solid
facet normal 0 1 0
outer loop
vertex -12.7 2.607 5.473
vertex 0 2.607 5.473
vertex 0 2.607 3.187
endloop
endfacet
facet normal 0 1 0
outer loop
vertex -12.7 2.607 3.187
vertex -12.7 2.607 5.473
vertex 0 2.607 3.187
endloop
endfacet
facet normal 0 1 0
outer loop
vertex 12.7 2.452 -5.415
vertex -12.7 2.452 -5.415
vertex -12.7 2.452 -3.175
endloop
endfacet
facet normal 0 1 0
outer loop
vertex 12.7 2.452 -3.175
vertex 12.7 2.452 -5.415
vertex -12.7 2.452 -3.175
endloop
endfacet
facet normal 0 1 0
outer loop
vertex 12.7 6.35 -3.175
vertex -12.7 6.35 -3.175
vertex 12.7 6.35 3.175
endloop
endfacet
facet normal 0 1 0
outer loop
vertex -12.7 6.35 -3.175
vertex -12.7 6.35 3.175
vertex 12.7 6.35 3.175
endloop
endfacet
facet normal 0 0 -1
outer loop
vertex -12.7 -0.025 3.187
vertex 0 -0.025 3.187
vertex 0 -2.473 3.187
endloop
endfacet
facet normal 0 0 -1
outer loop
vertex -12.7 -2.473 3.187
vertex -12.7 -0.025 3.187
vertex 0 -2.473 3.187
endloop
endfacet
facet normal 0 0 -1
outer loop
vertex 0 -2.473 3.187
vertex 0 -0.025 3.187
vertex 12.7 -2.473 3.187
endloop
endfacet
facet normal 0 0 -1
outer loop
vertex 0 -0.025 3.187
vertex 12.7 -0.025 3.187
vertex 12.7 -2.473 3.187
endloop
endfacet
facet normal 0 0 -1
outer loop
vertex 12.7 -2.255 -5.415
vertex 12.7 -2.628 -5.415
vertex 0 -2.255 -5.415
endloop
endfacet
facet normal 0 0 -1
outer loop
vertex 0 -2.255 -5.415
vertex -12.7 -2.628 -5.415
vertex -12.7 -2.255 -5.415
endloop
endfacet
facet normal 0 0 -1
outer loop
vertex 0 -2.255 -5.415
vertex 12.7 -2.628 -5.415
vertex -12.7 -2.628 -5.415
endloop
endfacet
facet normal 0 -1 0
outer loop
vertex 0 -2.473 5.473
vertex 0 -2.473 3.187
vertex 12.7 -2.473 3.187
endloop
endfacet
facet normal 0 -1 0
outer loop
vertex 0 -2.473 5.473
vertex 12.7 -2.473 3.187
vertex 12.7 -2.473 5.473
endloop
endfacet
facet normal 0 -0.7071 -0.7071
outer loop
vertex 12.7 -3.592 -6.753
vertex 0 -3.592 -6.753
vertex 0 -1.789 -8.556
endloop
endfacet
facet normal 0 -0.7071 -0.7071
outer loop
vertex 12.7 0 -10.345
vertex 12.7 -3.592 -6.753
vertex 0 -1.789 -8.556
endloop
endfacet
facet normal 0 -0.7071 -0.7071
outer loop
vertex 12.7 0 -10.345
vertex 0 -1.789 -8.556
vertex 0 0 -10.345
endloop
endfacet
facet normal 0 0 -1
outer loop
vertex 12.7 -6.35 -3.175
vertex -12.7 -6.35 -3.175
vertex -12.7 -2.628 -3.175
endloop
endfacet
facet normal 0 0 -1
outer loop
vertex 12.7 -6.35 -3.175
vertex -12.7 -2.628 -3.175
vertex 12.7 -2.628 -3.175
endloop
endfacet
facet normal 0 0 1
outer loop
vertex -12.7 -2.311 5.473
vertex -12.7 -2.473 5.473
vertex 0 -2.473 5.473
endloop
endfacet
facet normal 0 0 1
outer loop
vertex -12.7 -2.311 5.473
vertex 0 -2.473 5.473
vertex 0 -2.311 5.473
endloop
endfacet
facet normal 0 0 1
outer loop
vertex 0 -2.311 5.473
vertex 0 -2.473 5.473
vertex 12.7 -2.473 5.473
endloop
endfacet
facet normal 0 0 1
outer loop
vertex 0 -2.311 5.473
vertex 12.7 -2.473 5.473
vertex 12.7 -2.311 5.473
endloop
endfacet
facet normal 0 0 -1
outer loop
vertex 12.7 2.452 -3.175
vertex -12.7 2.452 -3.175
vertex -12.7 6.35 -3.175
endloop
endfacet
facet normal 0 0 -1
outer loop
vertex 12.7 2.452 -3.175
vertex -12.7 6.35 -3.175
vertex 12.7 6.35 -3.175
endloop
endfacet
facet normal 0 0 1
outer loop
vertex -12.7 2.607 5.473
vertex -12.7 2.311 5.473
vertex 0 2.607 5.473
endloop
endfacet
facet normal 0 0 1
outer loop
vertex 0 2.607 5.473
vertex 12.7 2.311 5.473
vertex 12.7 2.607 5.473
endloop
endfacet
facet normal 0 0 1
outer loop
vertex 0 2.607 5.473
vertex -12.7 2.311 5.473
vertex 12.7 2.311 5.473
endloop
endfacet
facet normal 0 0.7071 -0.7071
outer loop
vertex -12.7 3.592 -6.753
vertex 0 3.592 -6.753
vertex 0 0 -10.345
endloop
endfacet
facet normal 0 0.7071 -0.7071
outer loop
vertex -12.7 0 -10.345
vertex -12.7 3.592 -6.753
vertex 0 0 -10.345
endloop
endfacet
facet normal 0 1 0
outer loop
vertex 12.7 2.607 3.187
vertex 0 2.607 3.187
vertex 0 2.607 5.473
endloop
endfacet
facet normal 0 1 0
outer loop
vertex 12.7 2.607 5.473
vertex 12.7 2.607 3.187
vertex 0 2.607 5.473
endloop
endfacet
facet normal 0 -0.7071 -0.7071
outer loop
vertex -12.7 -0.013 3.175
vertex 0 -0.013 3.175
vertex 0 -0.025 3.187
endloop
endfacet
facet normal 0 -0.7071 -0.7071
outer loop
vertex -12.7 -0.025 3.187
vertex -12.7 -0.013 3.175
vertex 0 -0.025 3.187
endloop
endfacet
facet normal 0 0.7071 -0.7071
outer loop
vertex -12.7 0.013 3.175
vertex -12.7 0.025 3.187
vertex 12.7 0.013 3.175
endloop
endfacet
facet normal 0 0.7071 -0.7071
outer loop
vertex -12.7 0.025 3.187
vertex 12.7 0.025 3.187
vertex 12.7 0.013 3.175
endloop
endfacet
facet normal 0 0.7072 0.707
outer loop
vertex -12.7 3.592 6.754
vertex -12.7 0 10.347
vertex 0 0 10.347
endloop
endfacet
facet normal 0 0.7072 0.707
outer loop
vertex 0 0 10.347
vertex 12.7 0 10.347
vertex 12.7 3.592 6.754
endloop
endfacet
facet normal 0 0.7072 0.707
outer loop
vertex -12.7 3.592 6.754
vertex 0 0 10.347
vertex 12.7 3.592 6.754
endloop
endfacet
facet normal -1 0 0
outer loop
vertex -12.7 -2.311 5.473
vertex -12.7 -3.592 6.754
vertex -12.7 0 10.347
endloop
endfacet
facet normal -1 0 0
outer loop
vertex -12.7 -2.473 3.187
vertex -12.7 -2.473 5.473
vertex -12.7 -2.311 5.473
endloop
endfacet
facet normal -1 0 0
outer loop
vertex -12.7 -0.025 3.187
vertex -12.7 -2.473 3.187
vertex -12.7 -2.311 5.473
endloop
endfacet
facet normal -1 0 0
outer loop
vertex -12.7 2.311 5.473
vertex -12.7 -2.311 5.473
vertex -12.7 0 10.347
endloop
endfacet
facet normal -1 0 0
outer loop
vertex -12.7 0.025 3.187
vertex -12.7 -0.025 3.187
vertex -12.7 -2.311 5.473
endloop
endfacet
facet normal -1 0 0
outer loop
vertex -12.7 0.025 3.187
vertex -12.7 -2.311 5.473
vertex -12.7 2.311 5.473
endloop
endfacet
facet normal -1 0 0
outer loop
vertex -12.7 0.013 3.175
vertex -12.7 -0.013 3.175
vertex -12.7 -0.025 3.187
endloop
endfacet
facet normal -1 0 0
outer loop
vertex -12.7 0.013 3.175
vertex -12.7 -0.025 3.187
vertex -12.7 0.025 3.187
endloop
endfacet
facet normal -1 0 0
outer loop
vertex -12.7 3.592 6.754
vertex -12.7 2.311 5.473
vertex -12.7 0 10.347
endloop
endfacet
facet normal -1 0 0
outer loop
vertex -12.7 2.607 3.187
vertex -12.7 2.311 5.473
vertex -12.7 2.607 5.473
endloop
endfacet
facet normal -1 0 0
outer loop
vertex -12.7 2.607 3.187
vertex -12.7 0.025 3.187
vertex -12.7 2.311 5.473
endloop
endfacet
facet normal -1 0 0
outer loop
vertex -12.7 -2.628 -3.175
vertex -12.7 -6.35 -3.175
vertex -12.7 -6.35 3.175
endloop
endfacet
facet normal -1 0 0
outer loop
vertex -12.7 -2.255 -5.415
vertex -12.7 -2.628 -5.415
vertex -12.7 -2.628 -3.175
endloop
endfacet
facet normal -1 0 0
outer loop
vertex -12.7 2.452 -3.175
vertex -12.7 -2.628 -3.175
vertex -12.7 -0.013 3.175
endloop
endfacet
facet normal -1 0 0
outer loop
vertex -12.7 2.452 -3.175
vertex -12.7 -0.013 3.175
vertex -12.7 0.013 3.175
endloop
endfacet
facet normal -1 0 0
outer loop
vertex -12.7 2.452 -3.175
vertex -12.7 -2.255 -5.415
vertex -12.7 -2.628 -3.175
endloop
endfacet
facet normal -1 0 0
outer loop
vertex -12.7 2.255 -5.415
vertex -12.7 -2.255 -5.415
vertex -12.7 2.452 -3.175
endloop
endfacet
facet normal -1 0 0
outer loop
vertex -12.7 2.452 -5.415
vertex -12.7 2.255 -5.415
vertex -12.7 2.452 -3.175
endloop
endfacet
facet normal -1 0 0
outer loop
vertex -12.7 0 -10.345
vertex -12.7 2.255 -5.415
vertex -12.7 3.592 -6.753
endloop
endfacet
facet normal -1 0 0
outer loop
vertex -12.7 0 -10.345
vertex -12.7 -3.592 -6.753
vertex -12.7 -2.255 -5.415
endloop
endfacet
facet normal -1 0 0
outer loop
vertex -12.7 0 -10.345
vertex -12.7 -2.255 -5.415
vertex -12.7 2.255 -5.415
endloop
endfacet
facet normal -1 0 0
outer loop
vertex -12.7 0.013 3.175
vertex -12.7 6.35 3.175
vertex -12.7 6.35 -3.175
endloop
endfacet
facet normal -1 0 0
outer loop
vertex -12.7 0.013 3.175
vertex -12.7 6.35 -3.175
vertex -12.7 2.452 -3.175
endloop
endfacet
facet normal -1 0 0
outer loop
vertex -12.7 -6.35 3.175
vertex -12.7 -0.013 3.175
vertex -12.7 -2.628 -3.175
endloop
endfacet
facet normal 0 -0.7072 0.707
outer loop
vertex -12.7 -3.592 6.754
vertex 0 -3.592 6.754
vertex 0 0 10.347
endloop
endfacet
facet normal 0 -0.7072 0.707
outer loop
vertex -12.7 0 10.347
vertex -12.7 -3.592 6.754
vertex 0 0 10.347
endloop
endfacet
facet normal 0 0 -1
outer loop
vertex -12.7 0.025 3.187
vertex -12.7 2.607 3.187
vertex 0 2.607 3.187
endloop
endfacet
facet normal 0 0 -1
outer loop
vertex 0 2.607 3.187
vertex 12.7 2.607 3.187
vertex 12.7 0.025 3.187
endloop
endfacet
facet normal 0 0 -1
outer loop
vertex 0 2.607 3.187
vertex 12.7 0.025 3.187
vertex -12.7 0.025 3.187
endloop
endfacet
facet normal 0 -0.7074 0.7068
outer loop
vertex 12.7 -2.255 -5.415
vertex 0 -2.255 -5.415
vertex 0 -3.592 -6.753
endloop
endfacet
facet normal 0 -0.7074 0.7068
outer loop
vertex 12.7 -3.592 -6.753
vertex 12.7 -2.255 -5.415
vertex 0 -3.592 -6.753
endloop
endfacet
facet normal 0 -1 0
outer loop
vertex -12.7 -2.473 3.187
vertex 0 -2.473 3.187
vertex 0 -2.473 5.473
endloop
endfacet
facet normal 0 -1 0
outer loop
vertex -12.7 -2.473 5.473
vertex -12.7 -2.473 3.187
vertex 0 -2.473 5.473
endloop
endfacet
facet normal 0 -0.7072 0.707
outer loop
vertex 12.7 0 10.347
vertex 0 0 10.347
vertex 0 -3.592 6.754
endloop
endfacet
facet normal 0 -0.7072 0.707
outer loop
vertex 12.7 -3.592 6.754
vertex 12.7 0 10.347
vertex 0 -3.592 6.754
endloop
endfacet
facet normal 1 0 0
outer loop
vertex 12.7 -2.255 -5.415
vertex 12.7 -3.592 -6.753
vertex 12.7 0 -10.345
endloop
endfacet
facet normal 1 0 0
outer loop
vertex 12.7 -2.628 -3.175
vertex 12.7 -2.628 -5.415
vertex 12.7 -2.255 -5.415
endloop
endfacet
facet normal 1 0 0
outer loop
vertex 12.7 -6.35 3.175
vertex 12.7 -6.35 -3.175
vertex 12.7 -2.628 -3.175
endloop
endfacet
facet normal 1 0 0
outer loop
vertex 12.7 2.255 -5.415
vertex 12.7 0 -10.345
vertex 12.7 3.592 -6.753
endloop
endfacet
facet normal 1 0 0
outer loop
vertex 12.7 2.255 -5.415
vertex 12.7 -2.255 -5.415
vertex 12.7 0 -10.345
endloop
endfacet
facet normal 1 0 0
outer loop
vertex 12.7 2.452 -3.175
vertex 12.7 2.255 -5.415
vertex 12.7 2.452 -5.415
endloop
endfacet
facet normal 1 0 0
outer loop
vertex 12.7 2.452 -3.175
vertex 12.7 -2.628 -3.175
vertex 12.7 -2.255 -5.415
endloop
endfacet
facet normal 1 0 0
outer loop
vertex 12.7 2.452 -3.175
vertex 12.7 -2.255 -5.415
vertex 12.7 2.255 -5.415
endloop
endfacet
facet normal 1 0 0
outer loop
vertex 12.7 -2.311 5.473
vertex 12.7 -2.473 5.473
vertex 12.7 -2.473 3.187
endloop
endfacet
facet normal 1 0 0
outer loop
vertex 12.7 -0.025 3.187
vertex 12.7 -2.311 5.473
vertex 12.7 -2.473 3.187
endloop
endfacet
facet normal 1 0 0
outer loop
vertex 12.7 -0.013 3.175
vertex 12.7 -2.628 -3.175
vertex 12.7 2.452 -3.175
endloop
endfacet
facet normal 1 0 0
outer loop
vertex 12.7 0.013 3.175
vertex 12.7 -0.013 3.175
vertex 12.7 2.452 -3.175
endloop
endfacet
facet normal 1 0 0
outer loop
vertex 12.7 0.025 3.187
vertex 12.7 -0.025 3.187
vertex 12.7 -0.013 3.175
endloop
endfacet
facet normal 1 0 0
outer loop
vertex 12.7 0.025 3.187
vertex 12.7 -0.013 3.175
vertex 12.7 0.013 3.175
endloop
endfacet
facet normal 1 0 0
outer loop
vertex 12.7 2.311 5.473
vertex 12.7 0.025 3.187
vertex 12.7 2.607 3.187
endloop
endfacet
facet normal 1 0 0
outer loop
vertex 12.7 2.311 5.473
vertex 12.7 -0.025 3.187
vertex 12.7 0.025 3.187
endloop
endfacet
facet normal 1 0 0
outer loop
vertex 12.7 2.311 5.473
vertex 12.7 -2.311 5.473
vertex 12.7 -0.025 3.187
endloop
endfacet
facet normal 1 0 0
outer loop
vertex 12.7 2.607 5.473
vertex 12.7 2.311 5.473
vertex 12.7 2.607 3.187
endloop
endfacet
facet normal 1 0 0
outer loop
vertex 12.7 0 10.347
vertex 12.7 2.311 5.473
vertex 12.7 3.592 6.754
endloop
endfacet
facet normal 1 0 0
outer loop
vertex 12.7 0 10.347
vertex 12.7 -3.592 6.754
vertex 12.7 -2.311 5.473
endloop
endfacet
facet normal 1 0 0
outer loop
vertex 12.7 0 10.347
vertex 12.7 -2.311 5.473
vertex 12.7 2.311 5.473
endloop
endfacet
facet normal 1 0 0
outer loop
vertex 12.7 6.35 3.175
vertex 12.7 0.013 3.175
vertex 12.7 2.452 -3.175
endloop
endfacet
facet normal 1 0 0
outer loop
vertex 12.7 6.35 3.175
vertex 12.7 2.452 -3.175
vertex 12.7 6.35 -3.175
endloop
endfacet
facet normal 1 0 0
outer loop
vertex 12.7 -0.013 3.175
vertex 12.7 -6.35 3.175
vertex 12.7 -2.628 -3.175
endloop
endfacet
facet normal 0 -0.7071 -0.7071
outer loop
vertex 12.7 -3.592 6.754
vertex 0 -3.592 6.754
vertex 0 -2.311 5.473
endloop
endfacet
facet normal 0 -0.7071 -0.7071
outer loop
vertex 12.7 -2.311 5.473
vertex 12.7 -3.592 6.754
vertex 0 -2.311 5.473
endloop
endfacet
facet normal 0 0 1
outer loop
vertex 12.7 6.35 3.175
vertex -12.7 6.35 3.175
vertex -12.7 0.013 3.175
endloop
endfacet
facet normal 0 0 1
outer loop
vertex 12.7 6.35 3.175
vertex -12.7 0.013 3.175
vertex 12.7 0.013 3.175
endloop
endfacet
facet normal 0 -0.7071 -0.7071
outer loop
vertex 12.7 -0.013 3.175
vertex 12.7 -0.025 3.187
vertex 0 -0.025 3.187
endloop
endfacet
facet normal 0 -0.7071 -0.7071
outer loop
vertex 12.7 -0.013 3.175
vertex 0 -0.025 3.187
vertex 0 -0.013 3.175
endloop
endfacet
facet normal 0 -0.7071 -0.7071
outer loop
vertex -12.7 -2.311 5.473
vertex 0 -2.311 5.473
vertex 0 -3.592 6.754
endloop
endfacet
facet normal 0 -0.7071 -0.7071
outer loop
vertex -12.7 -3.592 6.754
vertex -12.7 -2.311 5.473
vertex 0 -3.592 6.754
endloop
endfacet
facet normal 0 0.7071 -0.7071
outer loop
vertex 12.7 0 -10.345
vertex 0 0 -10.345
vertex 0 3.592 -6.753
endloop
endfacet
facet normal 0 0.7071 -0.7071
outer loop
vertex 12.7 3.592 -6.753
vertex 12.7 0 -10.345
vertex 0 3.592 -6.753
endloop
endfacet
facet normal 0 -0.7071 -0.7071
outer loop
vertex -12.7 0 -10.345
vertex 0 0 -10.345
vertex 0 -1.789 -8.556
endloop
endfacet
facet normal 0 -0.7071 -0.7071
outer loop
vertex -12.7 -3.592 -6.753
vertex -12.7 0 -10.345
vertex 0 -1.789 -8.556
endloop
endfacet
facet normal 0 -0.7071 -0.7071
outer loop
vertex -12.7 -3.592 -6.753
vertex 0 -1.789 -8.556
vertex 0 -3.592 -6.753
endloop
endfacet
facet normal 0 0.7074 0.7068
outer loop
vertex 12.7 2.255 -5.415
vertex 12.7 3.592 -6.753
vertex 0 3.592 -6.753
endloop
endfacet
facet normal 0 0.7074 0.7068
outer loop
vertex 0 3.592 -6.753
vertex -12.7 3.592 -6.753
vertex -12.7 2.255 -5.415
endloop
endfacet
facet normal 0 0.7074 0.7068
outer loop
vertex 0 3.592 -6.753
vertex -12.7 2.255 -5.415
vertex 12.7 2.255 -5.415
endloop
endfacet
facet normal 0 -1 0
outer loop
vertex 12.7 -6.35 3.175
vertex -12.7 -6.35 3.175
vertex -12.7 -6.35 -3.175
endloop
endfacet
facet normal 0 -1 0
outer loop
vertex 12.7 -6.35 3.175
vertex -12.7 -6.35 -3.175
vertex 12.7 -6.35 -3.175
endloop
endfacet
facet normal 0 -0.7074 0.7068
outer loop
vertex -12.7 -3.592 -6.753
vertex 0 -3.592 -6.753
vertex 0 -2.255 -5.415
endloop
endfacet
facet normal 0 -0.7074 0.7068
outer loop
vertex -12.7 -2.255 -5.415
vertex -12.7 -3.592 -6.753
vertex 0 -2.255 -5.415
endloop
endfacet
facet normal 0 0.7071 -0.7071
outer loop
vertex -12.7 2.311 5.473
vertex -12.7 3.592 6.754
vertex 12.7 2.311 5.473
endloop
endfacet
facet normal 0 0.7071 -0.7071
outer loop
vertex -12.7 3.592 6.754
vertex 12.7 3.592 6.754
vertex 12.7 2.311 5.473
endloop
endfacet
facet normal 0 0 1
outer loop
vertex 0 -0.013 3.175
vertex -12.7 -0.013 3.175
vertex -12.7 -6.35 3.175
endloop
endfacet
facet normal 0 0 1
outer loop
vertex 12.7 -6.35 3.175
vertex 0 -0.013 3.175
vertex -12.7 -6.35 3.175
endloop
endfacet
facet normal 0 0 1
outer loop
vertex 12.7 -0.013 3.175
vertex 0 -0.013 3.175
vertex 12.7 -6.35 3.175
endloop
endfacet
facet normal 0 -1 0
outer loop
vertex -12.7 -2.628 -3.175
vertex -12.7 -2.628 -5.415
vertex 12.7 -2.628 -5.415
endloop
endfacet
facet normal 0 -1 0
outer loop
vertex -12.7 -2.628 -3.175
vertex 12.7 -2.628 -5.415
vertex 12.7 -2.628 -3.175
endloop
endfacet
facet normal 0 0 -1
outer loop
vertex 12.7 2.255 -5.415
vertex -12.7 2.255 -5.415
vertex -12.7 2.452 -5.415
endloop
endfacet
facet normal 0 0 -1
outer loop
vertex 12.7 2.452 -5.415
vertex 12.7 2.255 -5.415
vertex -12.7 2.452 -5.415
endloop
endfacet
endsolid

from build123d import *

# Parameters (mm, degrees)
F0_W      = 25.4
F0_H      = 12.7
F3_DEPTH  = 3.175
F3_FACE_W = 25.4
F3_FACE_H = 12.7
F4_DEPTH  = 3.175
F5_W      = 5.08
F5_H      = 2.286
F7_DEPTH  = 12.7
F6_W      = 5.08
F6_H      = 2.286
F8_DEPTH  = 12.7
F9_DEPTH  = 12.7


with BuildPart() as f3:
    # F0 (on Top) → F3 (new body)
    with BuildSketch(Plane.XY):
        Rectangle(F0_W, F0_H)
    extrude(amount=F3_DEPTH)

    # F3_face (on face) → F4 (join)
    with BuildSketch(Plane(origin=(0, 0, 0), x_dir=(1, 0, 0), z_dir=(0, 0, -1))):
        Rectangle(F3_FACE_W, F3_FACE_H)
    extrude(amount=F4_DEPTH)

    # F1 (on Right) + F5 (on Right) → F7 (join)
    with BuildSketch(Plane.YZ):
        Polygon((3.592102, 6.754402), (0, 10.346504), (-3.592102, 6.754402), (0, 3.1623), align=None)
    with BuildSketch(Plane.YZ):
        with Locations((0.06673, 4.330203)):
            Rectangle(F5_W, F5_H)
    extrude(amount=F7_DEPTH)

    # F6 (on Right) + F2 (on Right) → F8 (join)
    with BuildSketch(Plane.YZ):
        with Locations((-0.087894, -4.272406)):
            Rectangle(F6_W, F6_H)
    with BuildSketch(Plane.YZ):
        Polygon((0, -10.345057), (3.592102, -6.752954), (0, -3.160852), (-3.592102, -6.752954), align=None)
    extrude(amount=F8_DEPTH)

    # F7_face (on face) + F8_face (on face) → F9 (join)
    with BuildSketch(Plane(origin=(0, 0.024156, 6.218296), x_dir=(0, 1, 0), z_dir=(-1, 0, 0))):
        Polygon((-0.04906, 3.031093), (-2.497427, 3.031093), (-2.497427, 0.745093), (-2.33506, 0.745093), (-3.616259, -0.536106), (-0.024156, -4.128208), (3.567946, -0.536106), (2.286747, 0.745093), (2.582573, 0.745093), (2.582573, 3.031093), (0.000747, 3.031093), (-0.011456, 3.043296), (-0.036857, 3.043296), align=None)
    with BuildSketch(Plane(origin=(0, -0.031159, -6.212423), x_dir=(0, 1, 0), z_dir=(-1, 0, 0))):
        Polygon((-2.596735, -3.037423), (2.483265, -3.037423), (2.483265, -0.797017), (2.285713, -0.797017), (3.623261, 0.540531), (0.031159, 4.132633), (-3.560944, 0.540531), (-2.223395, -0.797017), (-2.596735, -0.797017), align=None)
    extrude(amount=F9_DEPTH)


solid = f3.part
